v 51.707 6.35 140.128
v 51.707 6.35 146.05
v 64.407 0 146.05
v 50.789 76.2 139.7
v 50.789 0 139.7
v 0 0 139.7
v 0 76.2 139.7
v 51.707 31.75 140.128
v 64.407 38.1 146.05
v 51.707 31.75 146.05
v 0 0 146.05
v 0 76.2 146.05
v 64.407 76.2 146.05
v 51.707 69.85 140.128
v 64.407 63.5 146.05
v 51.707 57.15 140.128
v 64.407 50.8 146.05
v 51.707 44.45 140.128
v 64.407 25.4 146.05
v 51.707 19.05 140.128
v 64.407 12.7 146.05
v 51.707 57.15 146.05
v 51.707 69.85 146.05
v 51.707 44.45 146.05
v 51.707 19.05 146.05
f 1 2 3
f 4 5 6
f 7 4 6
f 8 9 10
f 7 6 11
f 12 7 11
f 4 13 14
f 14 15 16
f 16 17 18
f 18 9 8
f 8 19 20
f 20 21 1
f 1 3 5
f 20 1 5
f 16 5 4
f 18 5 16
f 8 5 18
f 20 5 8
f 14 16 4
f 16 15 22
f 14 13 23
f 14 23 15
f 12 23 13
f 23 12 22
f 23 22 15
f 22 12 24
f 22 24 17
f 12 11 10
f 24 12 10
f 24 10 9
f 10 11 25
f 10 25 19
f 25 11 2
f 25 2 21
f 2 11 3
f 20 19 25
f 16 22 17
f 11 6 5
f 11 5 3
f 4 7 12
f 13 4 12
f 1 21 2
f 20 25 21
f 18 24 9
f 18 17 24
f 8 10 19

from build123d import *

# Parameters (mm, degrees)
BOSS_EXTRUDE1_DEPTH = 76.2
CUT_EXTRUDE1_DEPTH  = 7.35


with BuildPart() as part:
    # Sketch1 → Boss-Extrude1 (new body)
    with BuildSketch(Plane(origin=(0, 0, 0), x_dir=(1, 0, 0), z_dir=(0, 1, 0))):
        Polygon((0, -146.05), (64.407023089, -146.05), (50.789404144, -139.7), (0, -139.7), align=None)
    extrude(amount=BOSS_EXTRUDE1_DEPTH)

    # Sketch2 → Cut-Extrude1 (cut, through all)
    with BuildSketch(Plane.XY.offset(146.05)):
        Polygon((64.407023089, 0), (64.407023089, 12.7), (51.707023089, 6.35), align=None)
        Polygon((64.407023089, 12.7), (64.407023089, 25.4), (51.707023089, 19.05), align=None)
        Polygon((64.407023089, 25.4), (64.407023089, 38.1), (51.707023089, 31.75), align=None)
        Polygon((64.407023089, 38.1), (64.407023089, 50.8), (51.707023089, 44.45), align=None)
        Polygon((64.407023089, 50.8), (64.407023089, 63.5), (51.707023089, 57.15), align=None)
        Polygon((64.407023089, 63.5), (64.407023089, 76.2), (51.707023089, 69.85), align=None)
    extrude(amount=-CUT_EXTRUDE1_DEPTH, mode=Mode.SUBTRACT)


solid = part.part
